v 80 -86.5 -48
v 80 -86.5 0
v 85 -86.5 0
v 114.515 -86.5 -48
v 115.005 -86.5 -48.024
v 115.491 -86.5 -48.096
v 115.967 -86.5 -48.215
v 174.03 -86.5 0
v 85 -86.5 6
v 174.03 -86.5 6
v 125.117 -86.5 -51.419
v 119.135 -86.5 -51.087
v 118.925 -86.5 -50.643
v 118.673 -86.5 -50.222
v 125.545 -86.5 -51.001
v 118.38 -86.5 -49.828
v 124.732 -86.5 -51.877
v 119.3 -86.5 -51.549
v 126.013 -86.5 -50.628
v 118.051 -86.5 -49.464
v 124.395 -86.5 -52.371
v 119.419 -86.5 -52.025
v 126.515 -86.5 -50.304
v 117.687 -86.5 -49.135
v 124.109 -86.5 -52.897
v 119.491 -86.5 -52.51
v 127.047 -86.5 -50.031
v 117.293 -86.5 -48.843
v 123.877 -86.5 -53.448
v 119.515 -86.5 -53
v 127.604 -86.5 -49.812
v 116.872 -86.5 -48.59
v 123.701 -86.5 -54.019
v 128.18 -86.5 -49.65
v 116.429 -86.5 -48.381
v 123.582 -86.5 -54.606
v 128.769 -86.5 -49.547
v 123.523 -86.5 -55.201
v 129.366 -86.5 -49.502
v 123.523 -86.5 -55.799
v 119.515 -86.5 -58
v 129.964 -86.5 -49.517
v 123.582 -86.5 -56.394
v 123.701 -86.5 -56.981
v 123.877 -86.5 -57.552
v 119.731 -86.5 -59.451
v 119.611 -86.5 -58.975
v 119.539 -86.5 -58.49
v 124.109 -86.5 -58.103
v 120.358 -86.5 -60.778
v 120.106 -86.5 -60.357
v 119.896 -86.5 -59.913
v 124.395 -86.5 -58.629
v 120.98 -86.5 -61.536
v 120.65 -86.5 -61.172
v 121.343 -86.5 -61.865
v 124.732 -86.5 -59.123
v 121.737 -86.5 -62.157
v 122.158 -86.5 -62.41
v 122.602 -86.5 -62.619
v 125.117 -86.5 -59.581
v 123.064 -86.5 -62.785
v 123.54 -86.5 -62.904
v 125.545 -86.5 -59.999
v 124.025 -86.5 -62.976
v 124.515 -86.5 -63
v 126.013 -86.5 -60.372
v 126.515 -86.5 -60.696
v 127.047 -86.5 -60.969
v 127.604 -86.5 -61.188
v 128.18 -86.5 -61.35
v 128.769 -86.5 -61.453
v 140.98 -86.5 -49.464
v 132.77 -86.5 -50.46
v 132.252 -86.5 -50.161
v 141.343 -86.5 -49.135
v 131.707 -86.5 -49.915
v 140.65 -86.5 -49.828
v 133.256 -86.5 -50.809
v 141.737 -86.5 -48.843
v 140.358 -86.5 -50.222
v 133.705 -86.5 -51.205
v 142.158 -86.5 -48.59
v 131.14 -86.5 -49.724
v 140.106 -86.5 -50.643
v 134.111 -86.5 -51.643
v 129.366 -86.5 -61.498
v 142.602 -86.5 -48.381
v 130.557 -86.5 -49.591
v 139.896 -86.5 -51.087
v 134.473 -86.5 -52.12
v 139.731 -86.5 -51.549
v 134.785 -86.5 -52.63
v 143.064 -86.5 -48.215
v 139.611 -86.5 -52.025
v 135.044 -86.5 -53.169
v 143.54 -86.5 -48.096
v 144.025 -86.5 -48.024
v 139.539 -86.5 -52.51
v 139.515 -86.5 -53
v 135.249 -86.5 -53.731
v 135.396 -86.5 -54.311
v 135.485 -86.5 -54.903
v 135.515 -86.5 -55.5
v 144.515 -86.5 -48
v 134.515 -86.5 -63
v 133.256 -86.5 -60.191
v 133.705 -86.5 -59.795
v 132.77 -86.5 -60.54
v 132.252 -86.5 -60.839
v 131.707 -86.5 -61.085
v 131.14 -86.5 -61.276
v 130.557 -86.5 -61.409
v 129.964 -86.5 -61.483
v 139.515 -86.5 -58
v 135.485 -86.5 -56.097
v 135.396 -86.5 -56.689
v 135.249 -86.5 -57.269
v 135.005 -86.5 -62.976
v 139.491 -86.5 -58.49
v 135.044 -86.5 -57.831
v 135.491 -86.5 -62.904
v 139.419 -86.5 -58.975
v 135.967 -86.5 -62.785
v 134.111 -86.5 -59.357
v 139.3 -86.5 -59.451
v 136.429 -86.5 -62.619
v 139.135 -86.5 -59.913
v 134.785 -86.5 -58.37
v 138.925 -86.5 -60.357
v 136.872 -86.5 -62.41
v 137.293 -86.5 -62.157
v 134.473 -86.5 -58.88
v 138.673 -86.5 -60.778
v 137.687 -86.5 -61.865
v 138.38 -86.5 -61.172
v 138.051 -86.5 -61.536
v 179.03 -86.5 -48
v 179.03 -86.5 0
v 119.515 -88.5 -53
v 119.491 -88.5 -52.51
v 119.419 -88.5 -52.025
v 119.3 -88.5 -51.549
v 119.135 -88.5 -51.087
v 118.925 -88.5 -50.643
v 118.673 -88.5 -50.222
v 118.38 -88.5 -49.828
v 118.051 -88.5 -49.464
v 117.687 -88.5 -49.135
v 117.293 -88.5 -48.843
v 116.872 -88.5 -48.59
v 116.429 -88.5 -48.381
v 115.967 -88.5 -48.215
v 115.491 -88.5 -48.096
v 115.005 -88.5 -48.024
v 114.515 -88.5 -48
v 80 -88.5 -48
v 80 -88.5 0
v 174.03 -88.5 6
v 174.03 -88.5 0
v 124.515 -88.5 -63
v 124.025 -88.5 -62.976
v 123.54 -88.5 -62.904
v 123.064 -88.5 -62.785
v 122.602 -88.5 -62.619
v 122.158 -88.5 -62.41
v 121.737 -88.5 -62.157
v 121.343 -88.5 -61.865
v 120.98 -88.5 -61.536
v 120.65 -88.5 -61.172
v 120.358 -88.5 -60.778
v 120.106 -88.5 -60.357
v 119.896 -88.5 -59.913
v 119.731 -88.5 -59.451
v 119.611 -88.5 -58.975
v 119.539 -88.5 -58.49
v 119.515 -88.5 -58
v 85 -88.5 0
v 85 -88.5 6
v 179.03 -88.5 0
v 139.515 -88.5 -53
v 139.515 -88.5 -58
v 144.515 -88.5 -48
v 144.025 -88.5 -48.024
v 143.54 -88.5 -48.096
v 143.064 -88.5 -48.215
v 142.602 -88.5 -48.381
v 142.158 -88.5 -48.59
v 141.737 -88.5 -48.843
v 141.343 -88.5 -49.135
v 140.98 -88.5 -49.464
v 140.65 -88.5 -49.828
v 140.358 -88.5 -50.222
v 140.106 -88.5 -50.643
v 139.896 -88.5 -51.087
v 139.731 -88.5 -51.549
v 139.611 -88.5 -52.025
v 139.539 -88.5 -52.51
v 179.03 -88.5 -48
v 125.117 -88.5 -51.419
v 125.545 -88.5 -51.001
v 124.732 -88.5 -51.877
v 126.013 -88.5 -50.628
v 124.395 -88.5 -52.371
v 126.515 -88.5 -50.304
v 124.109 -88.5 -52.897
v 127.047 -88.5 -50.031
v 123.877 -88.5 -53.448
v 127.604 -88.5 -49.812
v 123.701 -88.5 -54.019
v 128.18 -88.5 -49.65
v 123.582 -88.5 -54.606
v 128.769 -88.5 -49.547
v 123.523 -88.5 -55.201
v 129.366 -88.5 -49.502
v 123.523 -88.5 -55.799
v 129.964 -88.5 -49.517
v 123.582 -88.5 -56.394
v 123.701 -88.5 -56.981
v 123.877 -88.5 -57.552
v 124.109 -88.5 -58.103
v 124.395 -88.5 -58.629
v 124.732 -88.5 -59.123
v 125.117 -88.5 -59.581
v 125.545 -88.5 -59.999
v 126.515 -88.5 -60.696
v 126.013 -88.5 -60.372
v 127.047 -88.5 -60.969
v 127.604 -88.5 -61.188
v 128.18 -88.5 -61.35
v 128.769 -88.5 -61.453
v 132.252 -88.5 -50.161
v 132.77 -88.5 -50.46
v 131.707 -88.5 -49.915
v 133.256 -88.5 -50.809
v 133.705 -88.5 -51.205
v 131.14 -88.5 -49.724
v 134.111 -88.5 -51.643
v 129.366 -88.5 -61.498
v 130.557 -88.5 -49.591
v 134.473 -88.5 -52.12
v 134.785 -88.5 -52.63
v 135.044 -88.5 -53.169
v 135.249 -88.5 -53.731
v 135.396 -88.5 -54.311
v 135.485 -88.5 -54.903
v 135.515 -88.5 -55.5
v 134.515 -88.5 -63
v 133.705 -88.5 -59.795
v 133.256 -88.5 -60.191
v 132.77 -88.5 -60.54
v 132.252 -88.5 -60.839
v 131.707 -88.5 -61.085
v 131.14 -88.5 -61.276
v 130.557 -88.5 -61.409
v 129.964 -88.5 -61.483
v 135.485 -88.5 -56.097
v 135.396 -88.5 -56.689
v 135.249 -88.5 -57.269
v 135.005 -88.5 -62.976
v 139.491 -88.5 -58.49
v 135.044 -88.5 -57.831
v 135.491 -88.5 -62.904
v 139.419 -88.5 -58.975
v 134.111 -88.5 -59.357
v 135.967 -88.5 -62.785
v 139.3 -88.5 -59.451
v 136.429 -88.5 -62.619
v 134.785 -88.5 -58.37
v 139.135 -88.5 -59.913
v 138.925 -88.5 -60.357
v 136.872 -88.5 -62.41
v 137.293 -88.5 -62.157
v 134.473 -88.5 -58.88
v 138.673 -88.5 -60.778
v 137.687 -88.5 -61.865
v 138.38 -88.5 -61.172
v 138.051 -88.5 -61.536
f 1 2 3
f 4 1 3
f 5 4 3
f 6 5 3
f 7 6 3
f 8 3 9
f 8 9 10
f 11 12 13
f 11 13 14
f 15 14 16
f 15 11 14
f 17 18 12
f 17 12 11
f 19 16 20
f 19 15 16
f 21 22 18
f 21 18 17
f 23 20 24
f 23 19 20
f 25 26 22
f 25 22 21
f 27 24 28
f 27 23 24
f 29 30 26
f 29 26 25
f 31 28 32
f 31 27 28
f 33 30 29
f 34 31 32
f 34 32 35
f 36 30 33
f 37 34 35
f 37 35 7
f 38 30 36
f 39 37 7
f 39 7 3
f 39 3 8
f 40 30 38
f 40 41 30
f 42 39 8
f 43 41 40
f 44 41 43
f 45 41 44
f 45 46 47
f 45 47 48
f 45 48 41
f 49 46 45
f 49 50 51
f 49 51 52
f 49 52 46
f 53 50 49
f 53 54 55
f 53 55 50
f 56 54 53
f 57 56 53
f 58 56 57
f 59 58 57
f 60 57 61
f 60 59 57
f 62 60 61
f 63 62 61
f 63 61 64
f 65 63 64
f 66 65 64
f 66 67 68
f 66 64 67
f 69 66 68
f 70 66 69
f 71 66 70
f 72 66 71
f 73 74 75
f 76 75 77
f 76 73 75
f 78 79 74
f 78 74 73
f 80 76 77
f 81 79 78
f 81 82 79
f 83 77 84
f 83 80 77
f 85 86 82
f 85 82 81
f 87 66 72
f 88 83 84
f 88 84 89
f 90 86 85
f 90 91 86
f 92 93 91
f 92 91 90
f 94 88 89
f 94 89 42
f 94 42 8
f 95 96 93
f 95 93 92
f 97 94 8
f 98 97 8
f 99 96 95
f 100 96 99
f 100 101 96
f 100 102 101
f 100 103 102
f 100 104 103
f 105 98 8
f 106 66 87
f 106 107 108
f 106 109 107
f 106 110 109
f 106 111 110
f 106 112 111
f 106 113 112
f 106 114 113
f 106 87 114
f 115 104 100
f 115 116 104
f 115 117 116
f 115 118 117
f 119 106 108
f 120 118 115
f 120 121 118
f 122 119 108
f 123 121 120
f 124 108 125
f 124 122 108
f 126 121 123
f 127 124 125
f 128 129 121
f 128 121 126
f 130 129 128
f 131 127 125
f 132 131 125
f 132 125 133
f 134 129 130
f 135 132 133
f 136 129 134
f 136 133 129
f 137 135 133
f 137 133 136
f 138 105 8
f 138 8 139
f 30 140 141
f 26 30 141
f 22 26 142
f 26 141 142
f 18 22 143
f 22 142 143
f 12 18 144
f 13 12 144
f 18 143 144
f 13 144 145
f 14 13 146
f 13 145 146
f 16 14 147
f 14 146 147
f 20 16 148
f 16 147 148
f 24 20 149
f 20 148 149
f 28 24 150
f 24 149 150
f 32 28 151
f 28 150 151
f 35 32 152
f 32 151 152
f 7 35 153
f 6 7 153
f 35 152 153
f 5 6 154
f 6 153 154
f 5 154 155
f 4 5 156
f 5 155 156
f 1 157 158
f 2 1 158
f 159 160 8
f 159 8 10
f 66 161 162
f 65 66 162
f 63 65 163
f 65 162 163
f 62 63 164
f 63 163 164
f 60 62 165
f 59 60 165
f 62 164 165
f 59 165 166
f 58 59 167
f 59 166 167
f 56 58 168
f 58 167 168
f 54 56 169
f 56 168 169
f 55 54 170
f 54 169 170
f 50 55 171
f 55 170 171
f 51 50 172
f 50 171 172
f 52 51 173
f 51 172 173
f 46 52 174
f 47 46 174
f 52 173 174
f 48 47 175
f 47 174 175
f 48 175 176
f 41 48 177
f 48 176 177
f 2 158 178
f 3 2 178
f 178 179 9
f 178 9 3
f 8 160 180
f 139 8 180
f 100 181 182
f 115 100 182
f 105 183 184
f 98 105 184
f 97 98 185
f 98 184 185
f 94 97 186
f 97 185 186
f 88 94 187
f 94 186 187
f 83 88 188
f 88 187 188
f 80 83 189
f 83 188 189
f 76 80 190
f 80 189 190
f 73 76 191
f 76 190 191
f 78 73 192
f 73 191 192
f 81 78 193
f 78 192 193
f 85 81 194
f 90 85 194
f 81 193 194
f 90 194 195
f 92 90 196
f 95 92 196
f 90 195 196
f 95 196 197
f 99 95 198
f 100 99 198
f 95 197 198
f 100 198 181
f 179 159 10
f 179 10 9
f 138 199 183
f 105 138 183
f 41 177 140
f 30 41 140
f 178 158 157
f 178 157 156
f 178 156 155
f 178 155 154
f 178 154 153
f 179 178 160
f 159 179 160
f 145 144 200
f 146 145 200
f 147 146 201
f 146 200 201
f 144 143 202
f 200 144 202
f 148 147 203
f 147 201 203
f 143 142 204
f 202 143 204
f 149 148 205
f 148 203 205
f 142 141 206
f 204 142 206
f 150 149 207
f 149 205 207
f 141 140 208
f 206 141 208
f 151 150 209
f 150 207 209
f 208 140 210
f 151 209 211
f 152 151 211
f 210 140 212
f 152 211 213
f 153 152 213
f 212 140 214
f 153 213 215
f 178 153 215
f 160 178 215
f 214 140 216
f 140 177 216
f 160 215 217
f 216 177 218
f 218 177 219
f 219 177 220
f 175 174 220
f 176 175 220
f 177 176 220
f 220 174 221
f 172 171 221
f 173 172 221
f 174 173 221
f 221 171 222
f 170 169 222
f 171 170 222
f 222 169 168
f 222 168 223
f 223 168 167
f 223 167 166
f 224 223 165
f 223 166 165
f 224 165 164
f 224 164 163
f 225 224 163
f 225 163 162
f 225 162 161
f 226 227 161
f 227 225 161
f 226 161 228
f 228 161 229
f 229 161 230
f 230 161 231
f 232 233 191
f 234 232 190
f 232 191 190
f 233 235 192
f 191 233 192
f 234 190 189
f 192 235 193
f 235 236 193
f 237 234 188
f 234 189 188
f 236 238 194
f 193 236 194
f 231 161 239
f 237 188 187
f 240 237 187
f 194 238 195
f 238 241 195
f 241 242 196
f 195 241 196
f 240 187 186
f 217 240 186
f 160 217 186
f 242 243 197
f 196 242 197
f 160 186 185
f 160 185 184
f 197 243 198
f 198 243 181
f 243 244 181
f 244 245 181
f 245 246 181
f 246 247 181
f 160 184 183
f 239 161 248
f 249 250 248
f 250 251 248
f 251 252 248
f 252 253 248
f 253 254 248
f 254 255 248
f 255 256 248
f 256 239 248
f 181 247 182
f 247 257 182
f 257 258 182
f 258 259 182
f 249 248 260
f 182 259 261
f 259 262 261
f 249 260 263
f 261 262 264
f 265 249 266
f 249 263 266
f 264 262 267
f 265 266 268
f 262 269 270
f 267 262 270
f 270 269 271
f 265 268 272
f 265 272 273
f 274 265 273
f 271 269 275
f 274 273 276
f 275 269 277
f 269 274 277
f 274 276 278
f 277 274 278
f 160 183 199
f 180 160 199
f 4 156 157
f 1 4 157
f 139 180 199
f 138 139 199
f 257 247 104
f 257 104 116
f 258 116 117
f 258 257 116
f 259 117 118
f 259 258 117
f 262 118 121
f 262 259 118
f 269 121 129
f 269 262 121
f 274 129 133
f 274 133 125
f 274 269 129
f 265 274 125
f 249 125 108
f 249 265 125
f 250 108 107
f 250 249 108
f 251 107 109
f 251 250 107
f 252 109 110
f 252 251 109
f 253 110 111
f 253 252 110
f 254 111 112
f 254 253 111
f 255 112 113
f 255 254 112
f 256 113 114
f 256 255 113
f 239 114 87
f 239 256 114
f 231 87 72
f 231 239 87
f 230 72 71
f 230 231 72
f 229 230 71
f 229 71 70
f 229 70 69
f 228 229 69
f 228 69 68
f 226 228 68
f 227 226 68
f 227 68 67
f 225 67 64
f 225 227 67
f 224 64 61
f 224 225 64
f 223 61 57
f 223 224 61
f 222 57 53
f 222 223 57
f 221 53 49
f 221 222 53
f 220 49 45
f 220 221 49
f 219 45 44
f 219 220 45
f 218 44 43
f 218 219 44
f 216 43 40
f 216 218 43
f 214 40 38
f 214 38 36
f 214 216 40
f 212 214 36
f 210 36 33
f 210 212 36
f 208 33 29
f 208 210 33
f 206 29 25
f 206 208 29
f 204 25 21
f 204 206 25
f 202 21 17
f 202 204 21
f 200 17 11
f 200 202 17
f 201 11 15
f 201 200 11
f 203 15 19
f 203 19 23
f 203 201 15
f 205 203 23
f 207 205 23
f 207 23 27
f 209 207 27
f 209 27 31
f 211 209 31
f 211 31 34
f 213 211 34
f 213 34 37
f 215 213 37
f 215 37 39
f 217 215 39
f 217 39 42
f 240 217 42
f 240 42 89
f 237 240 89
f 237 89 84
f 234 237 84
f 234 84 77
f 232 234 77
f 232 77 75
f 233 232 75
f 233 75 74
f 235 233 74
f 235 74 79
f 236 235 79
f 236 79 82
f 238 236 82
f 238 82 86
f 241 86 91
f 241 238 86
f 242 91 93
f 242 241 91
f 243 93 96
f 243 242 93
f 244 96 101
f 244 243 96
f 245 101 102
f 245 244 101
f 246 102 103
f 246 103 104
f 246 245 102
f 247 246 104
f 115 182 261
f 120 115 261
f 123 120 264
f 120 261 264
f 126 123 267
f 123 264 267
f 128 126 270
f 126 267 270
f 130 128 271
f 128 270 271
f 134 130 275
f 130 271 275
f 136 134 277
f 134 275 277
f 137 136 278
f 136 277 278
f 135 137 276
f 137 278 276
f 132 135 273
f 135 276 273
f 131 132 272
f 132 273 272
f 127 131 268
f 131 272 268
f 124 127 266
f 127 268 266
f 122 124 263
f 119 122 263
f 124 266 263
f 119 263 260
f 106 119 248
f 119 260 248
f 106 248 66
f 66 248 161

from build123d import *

# Parameters (mm, degrees)
ESTRUSIONE_ESTRUSIONE1_DEPTH      = 48
ESTRUSIONE_ESTRUSIONE1_DEPTH_BACK = 6
SCHIZZO1_W                        = 89.03043591
SCHIZZO1_H                        = 2
SCHIZZO2_W                        = 45
SCHIZZO2_H                        = 2
ESTRUSIONE_ESTRUSIONE2_DEPTH      = 5
SCHIZZO3_W                        = 5
SCHIZZO3_H                        = 2
ESTRUSIONE_ESTRUSIONE3_DEPTH      = 3
SCHIZZO4_W                        = 20
SCHIZZO4_H                        = 15
ESTRUSIONE_ESTRUSIONE4_DEPTH      = 2
SCHIZZO5_R                        = 6
TAGLIO_ESTRUSIONE1_DEPTH          = 10
RACCORDO1_R                       = 5
CORPO_SPOSTA_COPIA3_START         = -88.5
CORPO_SPOSTA_COPIA3_OUTLINE_R     = 6
CORPO_SPOSTA_COPIA3_DEPTH         = 2
CORPO_SPOSTA_COPIA3_2_OUTLINE_R   = 6
CORPO_SPOSTA_COPIA3_2_DEPTH       = 2


# Read off the part's stored shape, not the designer's step: Corpo-Sposta/copia3
with BuildPart() as part:
    # Schizzo1 → Estrusione-Estrusione1 (new, two sides: drawn at the far end of the back side and taken through both)
    with BuildSketch(Plane.XY.offset(-ESTRUSIONE_ESTRUSIONE1_DEPTH_BACK)):
        with Locations((129.515217955, -87.5)):
            Rectangle(SCHIZZO1_W, SCHIZZO1_H)
    extrude(amount=ESTRUSIONE_ESTRUSIONE1_DEPTH + ESTRUSIONE_ESTRUSIONE1_DEPTH_BACK)

    # Schizzo2 → Estrusione-Estrusione2 (add)
    with BuildSketch(Plane(origin=(174.03043591, 0, 0), x_dir=(0, 0, -1), z_dir=(1, 0, 0))):
        with Locations((-22.5, -87.5)):
            Rectangle(SCHIZZO2_W, SCHIZZO2_H)
    estrusione_estrusione2 = extrude(amount=ESTRUSIONE_ESTRUSIONE2_DEPTH)

    # Schizzo3 → Estrusione-Estrusione3 (add)
    with BuildSketch(Plane.XY.offset(45)):
        with Locations((176.53043591, -87.5)):
            Rectangle(SCHIZZO3_W, SCHIZZO3_H)
    estrusione_estrusione3 = extrude(amount=ESTRUSIONE_ESTRUSIONE3_DEPTH)

    # Specchia1: Estrusione-Estrusione2, Estrusione-Estrusione3 across plane
    add(estrusione_estrusione2.mirror(Plane(origin=(129.515217955, 0, 0), x_dir=(0, 0, 1), z_dir=(1, 0, 0))))
    add(estrusione_estrusione3.mirror(Plane(origin=(129.515217955, 0, 0), x_dir=(0, 0, 1), z_dir=(1, 0, 0))))

    # Schizzo4 → Estrusione-Estrusione4 (add)
    with BuildSketch(Plane(origin=(0, -88.5, 0), x_dir=(-1, 0, 0), z_dir=(0, -1, 0))):
        with Locations((-129.515217955, -55.5)):
            Rectangle(SCHIZZO4_W, SCHIZZO4_H)
    extrude(amount=-ESTRUSIONE_ESTRUSIONE4_DEPTH)

    # Schizzo5 → Taglio-Estrusione1 (cut)
    with BuildSketch(Plane.XZ.offset(88.5)):
        with Locations(Location((129.515217955, 55.5, 0), (0, 0, 270))):
            Circle(SCHIZZO5_R)
    extrude(amount=-TAGLIO_ESTRUSIONE1_DEPTH, mode=Mode.SUBTRACT)

    # Raccordo1
    raccordo1_edges = [part.edges().sort_by_distance(p)[0] for p in [
        (139.515217955, -87.5, 63),
        (139.515217955, -87.5, 48),
        (119.515217955, -87.5, 48),
        (119.515217955, -87.5, 63),
    ]]
    fillet(raccordo1_edges, radius=RACCORDO1_R)

    # Corpo-Sposta/copia3 outline → Corpo-Sposta/copia3 (cut)
    with BuildSketch(Plane(origin=(0, 0, 0), x_dir=(1, 0, 0), z_dir=(0, 1, 0)).offset(CORPO_SPOSTA_COPIA3_START)):
        with BuildLine():
            Line((179.03043591, -48), (179.03043591, 0))
            Line((179.03043591, 0), (174.03043591, 0))
            Line((174.03043591, 0), (174.03043591, -6))
            Line((174.03043591, -6), (85, -6))
            Line((85, -6), (85, 0))
            Line((85, 0), (80, 0))
            Line((80, 0), (80, -48))
            Line((80, -48), (114.515217955, -48))
            ThreePointArc((114.515217955, -48), (118.050751861, -49.464466094), (119.515217955, -53))
            Line((119.515217955, -53), (119.515217955, -58))
            ThreePointArc((119.515217955, -58), (120.979684049, -61.535533906), (124.515217955, -63))
            Line((124.515217955, -63), (134.515217955, -63))
            ThreePointArc((134.515217955, -63), (138.050751861, -61.535533906), (139.515217955, -58))
            Line((139.515217955, -58), (139.515217955, -53))
            ThreePointArc((139.515217955, -53), (140.979684049, -49.464466094), (144.515217955, -48))
            Line((144.515217955, -48), (179.03043591, -48))
        make_face()
        with Locations((129.515217955, -55.5)):
            Circle(CORPO_SPOSTA_COPIA3_OUTLINE_R, mode=Mode.SUBTRACT)
    extrude(amount=CORPO_SPOSTA_COPIA3_DEPTH, mode=Mode.SUBTRACT)

    # Corpo-Sposta_copia3 2 outline → Corpo-Sposta_copia3 2 (add)
    with BuildSketch(Plane(origin=(0, 0, 0), x_dir=(1, 0, 0), z_dir=(0, 1, 0)).offset(CORPO_SPOSTA_COPIA3_START)):
        with BuildLine():
            Line((179.03043591, 0), (179.03043591, 48))
            Line((179.03043591, 48), (144.515217955, 48))
            ThreePointArc((144.515217955, 48), (140.979684049, 49.464466094), (139.515217955, 53))
            Line((139.515217955, 53), (139.515217955, 58))
            ThreePointArc((139.515217955, 58), (138.050751861, 61.535533906), (134.515217955, 63))
            Line((134.515217955, 63), (124.515217955, 63))
            ThreePointArc((124.515217955, 63), (120.979684049, 61.535533906), (119.515217955, 58))
            Line((119.515217955, 58), (119.515217955, 53))
            ThreePointArc((119.515217955, 53), (118.050751861, 49.464466094), (114.515217955, 48))
            Line((114.515217955, 48), (80, 48))
            Line((80, 48), (80, 0))
            Line((80, 0), (85, 0))
            Line((85, 0), (85, 6))
            Line((85, 6), (174.03043591, 6))
            Line((174.03043591, 6), (174.03043591, 0))
            Line((174.03043591, 0), (179.03043591, 0))
        make_face()
        with Locations((129.515217955, 55.5)):
            Circle(CORPO_SPOSTA_COPIA3_2_OUTLINE_R, mode=Mode.SUBTRACT)
    extrude(amount=CORPO_SPOSTA_COPIA3_2_DEPTH)


solid = part.part
